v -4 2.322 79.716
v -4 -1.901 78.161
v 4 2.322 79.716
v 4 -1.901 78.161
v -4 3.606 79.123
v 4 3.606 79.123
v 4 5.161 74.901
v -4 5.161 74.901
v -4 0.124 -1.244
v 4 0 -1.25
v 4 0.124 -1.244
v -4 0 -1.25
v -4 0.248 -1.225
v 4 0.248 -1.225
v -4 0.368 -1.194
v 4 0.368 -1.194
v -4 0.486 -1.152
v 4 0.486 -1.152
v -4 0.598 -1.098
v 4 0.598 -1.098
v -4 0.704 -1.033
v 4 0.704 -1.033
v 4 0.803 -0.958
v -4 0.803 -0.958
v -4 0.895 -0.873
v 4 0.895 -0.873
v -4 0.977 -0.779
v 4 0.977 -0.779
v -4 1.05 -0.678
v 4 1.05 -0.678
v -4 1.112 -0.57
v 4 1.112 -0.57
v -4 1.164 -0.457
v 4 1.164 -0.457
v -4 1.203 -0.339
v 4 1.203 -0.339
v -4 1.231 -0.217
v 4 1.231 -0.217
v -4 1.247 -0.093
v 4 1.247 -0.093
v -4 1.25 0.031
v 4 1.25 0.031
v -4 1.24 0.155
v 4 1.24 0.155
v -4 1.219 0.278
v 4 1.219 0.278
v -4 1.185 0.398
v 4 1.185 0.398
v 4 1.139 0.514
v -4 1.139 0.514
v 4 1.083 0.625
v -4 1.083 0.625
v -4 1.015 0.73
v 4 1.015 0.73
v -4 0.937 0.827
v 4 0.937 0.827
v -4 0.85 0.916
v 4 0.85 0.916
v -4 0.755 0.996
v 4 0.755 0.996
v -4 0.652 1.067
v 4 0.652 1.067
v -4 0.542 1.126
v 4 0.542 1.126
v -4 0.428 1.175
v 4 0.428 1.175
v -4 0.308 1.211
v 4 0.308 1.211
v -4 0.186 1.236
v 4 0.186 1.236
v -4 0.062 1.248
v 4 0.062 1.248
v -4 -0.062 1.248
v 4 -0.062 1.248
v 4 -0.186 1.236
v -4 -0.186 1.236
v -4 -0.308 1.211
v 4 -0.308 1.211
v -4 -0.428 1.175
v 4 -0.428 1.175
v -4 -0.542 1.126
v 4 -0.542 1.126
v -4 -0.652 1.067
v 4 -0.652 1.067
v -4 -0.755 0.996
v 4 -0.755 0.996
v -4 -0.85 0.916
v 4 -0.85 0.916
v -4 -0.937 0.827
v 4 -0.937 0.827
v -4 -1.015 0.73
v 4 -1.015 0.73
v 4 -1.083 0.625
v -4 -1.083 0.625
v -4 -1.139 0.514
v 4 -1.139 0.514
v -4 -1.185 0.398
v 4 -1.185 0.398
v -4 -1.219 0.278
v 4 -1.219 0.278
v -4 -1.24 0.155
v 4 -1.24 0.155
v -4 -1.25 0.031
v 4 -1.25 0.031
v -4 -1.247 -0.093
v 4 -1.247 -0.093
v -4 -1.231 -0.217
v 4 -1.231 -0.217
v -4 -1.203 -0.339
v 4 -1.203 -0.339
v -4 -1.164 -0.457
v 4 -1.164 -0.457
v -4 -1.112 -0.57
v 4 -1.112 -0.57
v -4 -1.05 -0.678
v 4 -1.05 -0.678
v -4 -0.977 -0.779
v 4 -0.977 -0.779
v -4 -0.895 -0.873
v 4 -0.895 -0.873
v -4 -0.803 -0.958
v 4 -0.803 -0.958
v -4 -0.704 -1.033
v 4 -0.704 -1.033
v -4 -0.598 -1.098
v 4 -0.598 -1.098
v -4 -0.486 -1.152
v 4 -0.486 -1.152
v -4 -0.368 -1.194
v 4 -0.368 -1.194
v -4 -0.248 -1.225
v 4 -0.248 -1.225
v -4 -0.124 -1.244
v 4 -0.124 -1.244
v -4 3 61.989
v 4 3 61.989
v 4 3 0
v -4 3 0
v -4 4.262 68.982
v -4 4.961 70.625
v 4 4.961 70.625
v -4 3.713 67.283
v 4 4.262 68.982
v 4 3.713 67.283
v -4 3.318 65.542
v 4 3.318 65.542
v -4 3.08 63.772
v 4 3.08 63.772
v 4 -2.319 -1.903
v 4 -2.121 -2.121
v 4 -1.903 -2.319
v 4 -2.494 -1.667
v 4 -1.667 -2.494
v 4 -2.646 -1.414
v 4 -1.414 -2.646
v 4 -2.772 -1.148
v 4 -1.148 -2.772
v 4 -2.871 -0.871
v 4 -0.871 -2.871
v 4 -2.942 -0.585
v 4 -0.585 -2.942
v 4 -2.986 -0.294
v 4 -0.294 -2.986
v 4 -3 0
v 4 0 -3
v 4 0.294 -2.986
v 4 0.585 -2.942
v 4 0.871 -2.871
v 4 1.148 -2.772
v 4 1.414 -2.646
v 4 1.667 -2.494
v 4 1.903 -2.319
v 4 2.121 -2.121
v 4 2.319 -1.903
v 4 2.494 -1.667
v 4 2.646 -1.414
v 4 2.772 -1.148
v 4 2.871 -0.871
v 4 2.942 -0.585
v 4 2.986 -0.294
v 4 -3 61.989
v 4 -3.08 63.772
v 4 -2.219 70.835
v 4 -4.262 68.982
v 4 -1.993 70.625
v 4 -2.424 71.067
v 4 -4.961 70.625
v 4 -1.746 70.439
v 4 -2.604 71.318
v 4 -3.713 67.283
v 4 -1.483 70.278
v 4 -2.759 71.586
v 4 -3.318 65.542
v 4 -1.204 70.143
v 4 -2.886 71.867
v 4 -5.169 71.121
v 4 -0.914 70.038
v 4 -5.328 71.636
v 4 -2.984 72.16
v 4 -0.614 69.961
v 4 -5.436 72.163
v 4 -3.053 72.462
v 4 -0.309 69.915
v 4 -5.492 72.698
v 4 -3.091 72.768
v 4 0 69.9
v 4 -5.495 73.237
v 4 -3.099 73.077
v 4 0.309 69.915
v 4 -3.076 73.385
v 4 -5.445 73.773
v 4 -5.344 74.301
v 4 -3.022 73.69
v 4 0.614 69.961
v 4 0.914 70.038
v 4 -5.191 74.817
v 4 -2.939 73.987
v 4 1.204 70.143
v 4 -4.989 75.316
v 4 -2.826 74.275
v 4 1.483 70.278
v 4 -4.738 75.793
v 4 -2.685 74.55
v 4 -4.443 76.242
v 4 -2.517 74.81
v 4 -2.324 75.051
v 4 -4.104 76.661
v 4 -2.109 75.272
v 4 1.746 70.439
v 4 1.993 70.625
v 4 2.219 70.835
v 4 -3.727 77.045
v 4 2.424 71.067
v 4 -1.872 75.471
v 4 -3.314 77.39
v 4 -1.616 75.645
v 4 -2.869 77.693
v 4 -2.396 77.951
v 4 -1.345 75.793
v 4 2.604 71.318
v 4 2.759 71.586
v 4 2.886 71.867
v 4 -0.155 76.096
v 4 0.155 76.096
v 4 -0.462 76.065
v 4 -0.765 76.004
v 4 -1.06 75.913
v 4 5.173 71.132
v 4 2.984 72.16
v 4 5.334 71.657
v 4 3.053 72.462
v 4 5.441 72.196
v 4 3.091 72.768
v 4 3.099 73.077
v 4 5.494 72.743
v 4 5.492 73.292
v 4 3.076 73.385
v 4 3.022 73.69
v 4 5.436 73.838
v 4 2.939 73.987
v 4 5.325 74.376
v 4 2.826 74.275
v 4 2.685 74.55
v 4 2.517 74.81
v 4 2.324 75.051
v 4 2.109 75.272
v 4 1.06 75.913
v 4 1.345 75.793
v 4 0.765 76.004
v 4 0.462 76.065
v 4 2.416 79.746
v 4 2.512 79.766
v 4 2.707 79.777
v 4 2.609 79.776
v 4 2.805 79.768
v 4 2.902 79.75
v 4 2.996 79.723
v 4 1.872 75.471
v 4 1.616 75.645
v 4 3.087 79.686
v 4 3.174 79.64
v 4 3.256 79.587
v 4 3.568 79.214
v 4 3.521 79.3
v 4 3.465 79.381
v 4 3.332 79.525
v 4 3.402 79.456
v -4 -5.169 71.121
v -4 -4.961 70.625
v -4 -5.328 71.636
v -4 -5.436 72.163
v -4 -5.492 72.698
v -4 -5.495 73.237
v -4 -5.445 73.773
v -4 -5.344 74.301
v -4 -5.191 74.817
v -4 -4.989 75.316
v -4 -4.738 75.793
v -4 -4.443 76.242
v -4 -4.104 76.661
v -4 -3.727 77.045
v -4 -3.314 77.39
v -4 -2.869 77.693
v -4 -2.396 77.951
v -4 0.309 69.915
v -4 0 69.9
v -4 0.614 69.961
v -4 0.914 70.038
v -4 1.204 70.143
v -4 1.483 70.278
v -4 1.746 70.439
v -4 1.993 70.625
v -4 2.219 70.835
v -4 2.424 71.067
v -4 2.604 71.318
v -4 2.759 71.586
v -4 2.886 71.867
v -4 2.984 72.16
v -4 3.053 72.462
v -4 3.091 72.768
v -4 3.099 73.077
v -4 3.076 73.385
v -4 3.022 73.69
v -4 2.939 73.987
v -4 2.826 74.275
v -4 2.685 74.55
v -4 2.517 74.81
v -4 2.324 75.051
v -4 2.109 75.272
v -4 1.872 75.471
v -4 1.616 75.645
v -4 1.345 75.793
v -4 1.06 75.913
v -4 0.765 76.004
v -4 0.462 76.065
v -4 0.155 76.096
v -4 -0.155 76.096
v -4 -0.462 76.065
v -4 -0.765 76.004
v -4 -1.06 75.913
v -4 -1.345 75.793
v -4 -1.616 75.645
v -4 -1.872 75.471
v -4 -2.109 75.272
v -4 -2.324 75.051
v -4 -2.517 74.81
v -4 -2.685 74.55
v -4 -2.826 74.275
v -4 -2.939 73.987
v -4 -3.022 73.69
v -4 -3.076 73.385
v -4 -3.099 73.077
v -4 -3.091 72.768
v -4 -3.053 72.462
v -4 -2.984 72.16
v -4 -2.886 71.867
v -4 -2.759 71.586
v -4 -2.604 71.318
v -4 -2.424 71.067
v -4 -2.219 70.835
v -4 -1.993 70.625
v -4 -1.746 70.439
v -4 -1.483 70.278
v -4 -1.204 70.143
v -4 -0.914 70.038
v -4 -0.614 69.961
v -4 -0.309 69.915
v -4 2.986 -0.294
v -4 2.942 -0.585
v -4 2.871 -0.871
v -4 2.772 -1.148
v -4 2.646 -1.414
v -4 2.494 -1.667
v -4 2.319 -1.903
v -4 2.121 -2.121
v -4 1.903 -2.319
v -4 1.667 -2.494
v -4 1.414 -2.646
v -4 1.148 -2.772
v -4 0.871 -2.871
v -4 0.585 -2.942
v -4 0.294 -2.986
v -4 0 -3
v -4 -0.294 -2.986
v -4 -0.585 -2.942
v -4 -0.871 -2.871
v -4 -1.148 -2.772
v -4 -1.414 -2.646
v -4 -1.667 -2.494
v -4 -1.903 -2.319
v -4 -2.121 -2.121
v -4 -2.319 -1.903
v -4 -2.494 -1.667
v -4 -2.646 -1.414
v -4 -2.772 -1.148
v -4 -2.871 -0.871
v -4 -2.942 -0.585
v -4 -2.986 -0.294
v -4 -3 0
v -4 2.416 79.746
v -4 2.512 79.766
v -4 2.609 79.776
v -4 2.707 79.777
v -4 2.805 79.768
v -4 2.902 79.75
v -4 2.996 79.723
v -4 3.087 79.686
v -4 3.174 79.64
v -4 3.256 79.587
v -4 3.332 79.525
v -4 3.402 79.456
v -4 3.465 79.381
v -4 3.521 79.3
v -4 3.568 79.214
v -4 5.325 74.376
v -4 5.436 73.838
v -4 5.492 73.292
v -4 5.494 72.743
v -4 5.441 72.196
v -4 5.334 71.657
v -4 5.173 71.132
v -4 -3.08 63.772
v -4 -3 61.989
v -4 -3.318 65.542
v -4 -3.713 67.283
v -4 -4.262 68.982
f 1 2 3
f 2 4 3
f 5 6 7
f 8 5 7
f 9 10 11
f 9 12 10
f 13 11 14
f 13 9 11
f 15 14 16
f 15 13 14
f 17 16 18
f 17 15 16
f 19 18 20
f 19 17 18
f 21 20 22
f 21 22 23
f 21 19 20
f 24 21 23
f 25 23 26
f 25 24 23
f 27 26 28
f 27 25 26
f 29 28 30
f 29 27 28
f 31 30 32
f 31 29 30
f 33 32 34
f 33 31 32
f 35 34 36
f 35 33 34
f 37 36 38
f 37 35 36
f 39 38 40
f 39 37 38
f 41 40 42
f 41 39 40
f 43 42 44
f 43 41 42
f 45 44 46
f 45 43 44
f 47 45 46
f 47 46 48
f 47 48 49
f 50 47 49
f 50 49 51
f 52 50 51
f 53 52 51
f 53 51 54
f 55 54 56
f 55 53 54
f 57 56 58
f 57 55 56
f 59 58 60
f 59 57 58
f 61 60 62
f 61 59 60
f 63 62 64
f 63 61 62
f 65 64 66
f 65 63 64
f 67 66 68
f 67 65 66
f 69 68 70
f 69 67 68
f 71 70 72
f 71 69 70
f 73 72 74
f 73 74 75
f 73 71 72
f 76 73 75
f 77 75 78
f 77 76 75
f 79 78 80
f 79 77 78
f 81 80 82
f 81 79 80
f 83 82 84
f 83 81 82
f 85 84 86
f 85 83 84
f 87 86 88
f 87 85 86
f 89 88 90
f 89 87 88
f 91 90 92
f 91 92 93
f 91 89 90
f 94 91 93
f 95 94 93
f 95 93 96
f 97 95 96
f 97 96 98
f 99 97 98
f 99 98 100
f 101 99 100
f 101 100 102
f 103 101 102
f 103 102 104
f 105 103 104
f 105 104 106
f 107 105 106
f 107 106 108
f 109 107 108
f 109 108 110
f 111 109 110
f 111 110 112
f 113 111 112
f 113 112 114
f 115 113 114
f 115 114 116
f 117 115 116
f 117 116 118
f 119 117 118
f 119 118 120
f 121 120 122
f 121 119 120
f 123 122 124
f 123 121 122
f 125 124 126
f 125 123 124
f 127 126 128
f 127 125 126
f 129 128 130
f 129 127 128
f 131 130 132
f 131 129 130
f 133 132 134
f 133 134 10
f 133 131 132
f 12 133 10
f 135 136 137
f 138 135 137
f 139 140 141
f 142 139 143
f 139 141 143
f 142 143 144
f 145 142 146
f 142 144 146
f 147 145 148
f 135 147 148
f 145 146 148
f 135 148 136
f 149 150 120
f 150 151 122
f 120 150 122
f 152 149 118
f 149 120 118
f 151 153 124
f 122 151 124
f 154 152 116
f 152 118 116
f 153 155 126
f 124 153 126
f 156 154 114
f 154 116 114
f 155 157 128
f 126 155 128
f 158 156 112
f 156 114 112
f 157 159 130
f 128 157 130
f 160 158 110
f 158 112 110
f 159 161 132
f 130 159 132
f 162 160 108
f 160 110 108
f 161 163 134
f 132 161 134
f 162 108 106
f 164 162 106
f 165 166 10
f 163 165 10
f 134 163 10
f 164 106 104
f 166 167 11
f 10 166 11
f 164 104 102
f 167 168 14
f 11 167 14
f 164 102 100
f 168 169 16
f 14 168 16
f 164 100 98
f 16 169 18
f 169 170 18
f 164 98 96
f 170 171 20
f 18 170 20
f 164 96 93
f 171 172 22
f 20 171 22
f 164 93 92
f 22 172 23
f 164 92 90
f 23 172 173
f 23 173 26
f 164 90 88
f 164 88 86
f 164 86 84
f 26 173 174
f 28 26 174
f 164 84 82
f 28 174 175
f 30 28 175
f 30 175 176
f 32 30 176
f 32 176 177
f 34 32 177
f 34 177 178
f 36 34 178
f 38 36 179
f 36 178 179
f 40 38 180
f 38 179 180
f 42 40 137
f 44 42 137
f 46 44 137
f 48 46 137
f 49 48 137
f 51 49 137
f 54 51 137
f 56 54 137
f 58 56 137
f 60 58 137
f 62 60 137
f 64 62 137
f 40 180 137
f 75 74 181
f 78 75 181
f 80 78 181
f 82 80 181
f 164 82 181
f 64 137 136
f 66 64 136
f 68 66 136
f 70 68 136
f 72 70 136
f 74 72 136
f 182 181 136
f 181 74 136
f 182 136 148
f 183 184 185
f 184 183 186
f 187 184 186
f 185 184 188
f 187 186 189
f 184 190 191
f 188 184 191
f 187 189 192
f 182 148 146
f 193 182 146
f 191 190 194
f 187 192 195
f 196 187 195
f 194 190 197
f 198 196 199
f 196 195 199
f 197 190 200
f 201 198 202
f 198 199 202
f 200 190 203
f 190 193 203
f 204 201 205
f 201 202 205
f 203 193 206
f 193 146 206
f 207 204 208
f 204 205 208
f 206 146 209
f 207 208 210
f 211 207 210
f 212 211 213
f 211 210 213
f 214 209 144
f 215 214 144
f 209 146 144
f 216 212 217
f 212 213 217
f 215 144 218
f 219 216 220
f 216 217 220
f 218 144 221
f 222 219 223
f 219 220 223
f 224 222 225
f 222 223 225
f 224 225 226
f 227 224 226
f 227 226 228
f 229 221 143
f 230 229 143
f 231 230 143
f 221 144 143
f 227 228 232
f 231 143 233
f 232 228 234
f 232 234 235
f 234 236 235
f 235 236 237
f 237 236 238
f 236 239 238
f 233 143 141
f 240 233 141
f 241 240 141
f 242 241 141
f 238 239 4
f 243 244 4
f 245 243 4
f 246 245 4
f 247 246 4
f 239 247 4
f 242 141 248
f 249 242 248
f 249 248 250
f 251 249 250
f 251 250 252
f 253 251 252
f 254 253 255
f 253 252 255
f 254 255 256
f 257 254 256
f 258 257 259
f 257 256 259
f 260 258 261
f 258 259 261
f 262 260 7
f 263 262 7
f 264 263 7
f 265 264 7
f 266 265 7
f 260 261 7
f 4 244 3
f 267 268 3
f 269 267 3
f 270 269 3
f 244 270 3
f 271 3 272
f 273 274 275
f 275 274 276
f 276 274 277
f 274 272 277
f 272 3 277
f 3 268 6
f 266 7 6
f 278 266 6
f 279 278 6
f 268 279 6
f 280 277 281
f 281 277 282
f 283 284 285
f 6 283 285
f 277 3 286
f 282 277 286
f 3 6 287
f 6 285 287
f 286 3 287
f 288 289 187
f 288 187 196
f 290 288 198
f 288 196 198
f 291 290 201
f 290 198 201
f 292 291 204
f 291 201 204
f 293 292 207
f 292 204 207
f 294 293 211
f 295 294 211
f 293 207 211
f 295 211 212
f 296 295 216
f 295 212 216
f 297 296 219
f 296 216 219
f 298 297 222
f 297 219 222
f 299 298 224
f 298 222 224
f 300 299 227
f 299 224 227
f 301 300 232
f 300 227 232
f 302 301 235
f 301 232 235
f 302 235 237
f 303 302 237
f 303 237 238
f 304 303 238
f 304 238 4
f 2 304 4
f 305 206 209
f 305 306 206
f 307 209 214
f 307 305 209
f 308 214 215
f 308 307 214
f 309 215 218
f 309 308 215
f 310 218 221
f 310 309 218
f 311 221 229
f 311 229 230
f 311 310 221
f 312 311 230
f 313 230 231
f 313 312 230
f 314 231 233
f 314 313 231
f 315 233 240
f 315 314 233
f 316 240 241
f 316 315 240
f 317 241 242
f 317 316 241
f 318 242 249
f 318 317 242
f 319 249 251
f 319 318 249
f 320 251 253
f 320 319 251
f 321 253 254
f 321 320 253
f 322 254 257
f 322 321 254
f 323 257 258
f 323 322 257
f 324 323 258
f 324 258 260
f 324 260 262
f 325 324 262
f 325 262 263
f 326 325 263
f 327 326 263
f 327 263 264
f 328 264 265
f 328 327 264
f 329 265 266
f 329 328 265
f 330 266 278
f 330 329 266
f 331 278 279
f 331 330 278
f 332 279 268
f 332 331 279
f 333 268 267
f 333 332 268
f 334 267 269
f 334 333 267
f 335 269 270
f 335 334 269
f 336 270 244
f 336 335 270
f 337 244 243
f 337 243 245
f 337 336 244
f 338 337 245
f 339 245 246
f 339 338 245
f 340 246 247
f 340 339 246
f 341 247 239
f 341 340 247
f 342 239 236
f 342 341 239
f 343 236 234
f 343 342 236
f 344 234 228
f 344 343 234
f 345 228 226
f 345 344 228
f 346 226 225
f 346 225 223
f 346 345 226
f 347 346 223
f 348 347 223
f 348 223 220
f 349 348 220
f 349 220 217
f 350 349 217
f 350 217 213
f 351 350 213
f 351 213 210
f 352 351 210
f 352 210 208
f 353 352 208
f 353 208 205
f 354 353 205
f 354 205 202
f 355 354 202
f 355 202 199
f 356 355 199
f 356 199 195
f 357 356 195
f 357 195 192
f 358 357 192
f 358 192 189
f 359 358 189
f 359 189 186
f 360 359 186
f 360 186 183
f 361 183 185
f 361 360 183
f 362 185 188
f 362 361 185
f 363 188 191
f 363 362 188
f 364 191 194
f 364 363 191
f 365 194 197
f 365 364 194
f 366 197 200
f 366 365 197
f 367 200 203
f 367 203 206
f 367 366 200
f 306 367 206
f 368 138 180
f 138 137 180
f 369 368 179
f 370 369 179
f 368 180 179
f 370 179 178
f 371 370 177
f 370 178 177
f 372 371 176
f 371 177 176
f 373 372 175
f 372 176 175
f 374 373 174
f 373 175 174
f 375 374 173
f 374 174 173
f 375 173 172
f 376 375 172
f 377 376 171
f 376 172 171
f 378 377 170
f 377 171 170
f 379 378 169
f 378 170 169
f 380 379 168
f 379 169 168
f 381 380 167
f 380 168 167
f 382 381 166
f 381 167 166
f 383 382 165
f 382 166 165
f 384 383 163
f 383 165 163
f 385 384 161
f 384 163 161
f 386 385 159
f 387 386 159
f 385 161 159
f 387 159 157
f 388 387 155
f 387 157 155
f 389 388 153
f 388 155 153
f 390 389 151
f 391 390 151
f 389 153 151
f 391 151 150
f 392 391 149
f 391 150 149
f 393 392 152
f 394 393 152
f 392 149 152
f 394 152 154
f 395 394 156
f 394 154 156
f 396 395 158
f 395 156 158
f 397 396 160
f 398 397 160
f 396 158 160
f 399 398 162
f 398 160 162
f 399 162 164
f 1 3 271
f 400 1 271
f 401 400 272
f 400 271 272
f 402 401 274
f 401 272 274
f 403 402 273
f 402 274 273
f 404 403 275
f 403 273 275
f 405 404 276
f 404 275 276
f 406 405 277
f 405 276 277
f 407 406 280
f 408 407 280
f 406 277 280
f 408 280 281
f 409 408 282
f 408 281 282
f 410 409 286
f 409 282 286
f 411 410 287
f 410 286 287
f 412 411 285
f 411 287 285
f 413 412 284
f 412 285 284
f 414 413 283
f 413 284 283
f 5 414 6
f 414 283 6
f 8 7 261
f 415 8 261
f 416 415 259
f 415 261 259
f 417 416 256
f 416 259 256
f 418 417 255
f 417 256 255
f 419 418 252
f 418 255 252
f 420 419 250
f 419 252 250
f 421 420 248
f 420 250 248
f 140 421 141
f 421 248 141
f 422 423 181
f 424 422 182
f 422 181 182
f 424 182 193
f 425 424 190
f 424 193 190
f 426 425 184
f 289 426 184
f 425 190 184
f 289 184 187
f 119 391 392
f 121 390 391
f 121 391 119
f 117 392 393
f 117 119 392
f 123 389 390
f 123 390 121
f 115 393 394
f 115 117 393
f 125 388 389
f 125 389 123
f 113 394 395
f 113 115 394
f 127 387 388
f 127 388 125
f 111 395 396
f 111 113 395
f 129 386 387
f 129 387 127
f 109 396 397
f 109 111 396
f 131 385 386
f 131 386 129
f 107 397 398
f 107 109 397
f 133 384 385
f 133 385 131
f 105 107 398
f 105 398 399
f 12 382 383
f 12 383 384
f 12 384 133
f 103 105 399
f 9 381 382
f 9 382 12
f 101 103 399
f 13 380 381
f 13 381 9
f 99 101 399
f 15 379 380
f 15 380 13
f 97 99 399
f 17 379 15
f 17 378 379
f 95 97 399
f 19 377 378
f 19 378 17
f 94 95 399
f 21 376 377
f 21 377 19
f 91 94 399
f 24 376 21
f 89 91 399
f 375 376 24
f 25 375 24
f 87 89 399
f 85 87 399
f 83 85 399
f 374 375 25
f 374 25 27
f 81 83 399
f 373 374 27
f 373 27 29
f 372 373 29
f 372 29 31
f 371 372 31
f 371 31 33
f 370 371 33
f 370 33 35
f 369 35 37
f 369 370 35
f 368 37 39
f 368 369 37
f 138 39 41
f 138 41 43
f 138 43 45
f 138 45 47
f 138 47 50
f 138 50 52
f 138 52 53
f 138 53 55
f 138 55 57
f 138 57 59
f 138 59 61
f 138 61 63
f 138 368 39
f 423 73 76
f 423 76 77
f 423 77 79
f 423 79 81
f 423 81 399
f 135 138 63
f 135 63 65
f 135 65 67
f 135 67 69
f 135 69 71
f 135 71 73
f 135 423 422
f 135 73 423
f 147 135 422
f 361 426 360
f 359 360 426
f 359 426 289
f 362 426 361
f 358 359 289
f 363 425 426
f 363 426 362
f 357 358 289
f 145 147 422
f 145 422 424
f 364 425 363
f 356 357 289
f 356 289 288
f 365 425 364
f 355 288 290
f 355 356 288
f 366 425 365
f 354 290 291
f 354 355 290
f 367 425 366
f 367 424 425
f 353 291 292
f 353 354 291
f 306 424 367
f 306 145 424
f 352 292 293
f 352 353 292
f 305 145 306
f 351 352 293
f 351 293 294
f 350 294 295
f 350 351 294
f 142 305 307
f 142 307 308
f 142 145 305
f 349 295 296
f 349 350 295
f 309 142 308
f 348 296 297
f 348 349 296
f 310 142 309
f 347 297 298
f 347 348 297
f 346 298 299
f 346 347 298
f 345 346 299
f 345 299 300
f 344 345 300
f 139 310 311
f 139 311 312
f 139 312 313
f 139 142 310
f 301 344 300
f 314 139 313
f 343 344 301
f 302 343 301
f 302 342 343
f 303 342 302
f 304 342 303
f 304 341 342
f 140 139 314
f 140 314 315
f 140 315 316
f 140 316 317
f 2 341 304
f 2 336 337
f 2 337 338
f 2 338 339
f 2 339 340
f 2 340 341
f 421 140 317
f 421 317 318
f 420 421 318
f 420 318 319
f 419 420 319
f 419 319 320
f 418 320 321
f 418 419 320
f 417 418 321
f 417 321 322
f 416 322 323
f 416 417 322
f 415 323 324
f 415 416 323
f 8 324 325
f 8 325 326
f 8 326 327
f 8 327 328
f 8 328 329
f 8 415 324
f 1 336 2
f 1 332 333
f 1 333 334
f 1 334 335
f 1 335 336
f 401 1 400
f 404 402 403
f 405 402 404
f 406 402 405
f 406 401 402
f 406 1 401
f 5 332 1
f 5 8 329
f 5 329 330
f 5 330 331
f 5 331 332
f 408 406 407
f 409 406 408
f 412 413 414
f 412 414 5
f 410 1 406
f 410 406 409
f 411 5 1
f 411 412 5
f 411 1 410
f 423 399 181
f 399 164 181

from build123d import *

# Parameters (mm, degrees)
SKETCH1_R           = 1.25
SKETCH1_R_2         = 3.1
BOSS_EXTRUDE1_DEPTH = 4


with BuildPart() as part:
    # Sketch1 → Boss-Extrude1 (new, symmetric)
    with BuildSketch(Plane(origin=(0, 0, 0), x_dir=(0, 0, -1), z_dir=(1, 0, 0))):
        with BuildLine():
            Line((-61.988642227, 3), (0, 3))
            ThreePointArc((0, 3), (3, 0), (0, -3))
            Line((0, -3), (-61.988642227, -3))
            ThreePointArc((-61.988642227, -3), (-66.416716655, -3.496355293), (-70.625001265, -4.960784314))
            ThreePointArc((-70.625001265, -4.960784314), (-75.069194472, -5.095923296), (-78.161118418, -1.900751608))
            Line((-78.161118418, -1.900751608), (-79.716278824, 2.321981644))
            ThreePointArc((-79.716278824, 2.321981644), (-79.685802054, 3.086741478), (-79.123484859, 3.605958012))
            Line((-79.123484859, 3.605958012), (-74.900751608, 5.161118418))
            ThreePointArc((-74.900751608, 5.161118418), (-72.742587835, 5.493972968), (-70.625001265, 4.960784314))
            ThreePointArc((-70.625001265, 4.960784314), (-66.416716655, 3.496355293), (-61.988642227, 3))
        make_face()
        Circle(SKETCH1_R, mode=Mode.SUBTRACT)
        with Locations((-73, 0)):
            Circle(SKETCH1_R_2, mode=Mode.SUBTRACT)
    extrude(amount=BOSS_EXTRUDE1_DEPTH, both=True)


solid = part.part
